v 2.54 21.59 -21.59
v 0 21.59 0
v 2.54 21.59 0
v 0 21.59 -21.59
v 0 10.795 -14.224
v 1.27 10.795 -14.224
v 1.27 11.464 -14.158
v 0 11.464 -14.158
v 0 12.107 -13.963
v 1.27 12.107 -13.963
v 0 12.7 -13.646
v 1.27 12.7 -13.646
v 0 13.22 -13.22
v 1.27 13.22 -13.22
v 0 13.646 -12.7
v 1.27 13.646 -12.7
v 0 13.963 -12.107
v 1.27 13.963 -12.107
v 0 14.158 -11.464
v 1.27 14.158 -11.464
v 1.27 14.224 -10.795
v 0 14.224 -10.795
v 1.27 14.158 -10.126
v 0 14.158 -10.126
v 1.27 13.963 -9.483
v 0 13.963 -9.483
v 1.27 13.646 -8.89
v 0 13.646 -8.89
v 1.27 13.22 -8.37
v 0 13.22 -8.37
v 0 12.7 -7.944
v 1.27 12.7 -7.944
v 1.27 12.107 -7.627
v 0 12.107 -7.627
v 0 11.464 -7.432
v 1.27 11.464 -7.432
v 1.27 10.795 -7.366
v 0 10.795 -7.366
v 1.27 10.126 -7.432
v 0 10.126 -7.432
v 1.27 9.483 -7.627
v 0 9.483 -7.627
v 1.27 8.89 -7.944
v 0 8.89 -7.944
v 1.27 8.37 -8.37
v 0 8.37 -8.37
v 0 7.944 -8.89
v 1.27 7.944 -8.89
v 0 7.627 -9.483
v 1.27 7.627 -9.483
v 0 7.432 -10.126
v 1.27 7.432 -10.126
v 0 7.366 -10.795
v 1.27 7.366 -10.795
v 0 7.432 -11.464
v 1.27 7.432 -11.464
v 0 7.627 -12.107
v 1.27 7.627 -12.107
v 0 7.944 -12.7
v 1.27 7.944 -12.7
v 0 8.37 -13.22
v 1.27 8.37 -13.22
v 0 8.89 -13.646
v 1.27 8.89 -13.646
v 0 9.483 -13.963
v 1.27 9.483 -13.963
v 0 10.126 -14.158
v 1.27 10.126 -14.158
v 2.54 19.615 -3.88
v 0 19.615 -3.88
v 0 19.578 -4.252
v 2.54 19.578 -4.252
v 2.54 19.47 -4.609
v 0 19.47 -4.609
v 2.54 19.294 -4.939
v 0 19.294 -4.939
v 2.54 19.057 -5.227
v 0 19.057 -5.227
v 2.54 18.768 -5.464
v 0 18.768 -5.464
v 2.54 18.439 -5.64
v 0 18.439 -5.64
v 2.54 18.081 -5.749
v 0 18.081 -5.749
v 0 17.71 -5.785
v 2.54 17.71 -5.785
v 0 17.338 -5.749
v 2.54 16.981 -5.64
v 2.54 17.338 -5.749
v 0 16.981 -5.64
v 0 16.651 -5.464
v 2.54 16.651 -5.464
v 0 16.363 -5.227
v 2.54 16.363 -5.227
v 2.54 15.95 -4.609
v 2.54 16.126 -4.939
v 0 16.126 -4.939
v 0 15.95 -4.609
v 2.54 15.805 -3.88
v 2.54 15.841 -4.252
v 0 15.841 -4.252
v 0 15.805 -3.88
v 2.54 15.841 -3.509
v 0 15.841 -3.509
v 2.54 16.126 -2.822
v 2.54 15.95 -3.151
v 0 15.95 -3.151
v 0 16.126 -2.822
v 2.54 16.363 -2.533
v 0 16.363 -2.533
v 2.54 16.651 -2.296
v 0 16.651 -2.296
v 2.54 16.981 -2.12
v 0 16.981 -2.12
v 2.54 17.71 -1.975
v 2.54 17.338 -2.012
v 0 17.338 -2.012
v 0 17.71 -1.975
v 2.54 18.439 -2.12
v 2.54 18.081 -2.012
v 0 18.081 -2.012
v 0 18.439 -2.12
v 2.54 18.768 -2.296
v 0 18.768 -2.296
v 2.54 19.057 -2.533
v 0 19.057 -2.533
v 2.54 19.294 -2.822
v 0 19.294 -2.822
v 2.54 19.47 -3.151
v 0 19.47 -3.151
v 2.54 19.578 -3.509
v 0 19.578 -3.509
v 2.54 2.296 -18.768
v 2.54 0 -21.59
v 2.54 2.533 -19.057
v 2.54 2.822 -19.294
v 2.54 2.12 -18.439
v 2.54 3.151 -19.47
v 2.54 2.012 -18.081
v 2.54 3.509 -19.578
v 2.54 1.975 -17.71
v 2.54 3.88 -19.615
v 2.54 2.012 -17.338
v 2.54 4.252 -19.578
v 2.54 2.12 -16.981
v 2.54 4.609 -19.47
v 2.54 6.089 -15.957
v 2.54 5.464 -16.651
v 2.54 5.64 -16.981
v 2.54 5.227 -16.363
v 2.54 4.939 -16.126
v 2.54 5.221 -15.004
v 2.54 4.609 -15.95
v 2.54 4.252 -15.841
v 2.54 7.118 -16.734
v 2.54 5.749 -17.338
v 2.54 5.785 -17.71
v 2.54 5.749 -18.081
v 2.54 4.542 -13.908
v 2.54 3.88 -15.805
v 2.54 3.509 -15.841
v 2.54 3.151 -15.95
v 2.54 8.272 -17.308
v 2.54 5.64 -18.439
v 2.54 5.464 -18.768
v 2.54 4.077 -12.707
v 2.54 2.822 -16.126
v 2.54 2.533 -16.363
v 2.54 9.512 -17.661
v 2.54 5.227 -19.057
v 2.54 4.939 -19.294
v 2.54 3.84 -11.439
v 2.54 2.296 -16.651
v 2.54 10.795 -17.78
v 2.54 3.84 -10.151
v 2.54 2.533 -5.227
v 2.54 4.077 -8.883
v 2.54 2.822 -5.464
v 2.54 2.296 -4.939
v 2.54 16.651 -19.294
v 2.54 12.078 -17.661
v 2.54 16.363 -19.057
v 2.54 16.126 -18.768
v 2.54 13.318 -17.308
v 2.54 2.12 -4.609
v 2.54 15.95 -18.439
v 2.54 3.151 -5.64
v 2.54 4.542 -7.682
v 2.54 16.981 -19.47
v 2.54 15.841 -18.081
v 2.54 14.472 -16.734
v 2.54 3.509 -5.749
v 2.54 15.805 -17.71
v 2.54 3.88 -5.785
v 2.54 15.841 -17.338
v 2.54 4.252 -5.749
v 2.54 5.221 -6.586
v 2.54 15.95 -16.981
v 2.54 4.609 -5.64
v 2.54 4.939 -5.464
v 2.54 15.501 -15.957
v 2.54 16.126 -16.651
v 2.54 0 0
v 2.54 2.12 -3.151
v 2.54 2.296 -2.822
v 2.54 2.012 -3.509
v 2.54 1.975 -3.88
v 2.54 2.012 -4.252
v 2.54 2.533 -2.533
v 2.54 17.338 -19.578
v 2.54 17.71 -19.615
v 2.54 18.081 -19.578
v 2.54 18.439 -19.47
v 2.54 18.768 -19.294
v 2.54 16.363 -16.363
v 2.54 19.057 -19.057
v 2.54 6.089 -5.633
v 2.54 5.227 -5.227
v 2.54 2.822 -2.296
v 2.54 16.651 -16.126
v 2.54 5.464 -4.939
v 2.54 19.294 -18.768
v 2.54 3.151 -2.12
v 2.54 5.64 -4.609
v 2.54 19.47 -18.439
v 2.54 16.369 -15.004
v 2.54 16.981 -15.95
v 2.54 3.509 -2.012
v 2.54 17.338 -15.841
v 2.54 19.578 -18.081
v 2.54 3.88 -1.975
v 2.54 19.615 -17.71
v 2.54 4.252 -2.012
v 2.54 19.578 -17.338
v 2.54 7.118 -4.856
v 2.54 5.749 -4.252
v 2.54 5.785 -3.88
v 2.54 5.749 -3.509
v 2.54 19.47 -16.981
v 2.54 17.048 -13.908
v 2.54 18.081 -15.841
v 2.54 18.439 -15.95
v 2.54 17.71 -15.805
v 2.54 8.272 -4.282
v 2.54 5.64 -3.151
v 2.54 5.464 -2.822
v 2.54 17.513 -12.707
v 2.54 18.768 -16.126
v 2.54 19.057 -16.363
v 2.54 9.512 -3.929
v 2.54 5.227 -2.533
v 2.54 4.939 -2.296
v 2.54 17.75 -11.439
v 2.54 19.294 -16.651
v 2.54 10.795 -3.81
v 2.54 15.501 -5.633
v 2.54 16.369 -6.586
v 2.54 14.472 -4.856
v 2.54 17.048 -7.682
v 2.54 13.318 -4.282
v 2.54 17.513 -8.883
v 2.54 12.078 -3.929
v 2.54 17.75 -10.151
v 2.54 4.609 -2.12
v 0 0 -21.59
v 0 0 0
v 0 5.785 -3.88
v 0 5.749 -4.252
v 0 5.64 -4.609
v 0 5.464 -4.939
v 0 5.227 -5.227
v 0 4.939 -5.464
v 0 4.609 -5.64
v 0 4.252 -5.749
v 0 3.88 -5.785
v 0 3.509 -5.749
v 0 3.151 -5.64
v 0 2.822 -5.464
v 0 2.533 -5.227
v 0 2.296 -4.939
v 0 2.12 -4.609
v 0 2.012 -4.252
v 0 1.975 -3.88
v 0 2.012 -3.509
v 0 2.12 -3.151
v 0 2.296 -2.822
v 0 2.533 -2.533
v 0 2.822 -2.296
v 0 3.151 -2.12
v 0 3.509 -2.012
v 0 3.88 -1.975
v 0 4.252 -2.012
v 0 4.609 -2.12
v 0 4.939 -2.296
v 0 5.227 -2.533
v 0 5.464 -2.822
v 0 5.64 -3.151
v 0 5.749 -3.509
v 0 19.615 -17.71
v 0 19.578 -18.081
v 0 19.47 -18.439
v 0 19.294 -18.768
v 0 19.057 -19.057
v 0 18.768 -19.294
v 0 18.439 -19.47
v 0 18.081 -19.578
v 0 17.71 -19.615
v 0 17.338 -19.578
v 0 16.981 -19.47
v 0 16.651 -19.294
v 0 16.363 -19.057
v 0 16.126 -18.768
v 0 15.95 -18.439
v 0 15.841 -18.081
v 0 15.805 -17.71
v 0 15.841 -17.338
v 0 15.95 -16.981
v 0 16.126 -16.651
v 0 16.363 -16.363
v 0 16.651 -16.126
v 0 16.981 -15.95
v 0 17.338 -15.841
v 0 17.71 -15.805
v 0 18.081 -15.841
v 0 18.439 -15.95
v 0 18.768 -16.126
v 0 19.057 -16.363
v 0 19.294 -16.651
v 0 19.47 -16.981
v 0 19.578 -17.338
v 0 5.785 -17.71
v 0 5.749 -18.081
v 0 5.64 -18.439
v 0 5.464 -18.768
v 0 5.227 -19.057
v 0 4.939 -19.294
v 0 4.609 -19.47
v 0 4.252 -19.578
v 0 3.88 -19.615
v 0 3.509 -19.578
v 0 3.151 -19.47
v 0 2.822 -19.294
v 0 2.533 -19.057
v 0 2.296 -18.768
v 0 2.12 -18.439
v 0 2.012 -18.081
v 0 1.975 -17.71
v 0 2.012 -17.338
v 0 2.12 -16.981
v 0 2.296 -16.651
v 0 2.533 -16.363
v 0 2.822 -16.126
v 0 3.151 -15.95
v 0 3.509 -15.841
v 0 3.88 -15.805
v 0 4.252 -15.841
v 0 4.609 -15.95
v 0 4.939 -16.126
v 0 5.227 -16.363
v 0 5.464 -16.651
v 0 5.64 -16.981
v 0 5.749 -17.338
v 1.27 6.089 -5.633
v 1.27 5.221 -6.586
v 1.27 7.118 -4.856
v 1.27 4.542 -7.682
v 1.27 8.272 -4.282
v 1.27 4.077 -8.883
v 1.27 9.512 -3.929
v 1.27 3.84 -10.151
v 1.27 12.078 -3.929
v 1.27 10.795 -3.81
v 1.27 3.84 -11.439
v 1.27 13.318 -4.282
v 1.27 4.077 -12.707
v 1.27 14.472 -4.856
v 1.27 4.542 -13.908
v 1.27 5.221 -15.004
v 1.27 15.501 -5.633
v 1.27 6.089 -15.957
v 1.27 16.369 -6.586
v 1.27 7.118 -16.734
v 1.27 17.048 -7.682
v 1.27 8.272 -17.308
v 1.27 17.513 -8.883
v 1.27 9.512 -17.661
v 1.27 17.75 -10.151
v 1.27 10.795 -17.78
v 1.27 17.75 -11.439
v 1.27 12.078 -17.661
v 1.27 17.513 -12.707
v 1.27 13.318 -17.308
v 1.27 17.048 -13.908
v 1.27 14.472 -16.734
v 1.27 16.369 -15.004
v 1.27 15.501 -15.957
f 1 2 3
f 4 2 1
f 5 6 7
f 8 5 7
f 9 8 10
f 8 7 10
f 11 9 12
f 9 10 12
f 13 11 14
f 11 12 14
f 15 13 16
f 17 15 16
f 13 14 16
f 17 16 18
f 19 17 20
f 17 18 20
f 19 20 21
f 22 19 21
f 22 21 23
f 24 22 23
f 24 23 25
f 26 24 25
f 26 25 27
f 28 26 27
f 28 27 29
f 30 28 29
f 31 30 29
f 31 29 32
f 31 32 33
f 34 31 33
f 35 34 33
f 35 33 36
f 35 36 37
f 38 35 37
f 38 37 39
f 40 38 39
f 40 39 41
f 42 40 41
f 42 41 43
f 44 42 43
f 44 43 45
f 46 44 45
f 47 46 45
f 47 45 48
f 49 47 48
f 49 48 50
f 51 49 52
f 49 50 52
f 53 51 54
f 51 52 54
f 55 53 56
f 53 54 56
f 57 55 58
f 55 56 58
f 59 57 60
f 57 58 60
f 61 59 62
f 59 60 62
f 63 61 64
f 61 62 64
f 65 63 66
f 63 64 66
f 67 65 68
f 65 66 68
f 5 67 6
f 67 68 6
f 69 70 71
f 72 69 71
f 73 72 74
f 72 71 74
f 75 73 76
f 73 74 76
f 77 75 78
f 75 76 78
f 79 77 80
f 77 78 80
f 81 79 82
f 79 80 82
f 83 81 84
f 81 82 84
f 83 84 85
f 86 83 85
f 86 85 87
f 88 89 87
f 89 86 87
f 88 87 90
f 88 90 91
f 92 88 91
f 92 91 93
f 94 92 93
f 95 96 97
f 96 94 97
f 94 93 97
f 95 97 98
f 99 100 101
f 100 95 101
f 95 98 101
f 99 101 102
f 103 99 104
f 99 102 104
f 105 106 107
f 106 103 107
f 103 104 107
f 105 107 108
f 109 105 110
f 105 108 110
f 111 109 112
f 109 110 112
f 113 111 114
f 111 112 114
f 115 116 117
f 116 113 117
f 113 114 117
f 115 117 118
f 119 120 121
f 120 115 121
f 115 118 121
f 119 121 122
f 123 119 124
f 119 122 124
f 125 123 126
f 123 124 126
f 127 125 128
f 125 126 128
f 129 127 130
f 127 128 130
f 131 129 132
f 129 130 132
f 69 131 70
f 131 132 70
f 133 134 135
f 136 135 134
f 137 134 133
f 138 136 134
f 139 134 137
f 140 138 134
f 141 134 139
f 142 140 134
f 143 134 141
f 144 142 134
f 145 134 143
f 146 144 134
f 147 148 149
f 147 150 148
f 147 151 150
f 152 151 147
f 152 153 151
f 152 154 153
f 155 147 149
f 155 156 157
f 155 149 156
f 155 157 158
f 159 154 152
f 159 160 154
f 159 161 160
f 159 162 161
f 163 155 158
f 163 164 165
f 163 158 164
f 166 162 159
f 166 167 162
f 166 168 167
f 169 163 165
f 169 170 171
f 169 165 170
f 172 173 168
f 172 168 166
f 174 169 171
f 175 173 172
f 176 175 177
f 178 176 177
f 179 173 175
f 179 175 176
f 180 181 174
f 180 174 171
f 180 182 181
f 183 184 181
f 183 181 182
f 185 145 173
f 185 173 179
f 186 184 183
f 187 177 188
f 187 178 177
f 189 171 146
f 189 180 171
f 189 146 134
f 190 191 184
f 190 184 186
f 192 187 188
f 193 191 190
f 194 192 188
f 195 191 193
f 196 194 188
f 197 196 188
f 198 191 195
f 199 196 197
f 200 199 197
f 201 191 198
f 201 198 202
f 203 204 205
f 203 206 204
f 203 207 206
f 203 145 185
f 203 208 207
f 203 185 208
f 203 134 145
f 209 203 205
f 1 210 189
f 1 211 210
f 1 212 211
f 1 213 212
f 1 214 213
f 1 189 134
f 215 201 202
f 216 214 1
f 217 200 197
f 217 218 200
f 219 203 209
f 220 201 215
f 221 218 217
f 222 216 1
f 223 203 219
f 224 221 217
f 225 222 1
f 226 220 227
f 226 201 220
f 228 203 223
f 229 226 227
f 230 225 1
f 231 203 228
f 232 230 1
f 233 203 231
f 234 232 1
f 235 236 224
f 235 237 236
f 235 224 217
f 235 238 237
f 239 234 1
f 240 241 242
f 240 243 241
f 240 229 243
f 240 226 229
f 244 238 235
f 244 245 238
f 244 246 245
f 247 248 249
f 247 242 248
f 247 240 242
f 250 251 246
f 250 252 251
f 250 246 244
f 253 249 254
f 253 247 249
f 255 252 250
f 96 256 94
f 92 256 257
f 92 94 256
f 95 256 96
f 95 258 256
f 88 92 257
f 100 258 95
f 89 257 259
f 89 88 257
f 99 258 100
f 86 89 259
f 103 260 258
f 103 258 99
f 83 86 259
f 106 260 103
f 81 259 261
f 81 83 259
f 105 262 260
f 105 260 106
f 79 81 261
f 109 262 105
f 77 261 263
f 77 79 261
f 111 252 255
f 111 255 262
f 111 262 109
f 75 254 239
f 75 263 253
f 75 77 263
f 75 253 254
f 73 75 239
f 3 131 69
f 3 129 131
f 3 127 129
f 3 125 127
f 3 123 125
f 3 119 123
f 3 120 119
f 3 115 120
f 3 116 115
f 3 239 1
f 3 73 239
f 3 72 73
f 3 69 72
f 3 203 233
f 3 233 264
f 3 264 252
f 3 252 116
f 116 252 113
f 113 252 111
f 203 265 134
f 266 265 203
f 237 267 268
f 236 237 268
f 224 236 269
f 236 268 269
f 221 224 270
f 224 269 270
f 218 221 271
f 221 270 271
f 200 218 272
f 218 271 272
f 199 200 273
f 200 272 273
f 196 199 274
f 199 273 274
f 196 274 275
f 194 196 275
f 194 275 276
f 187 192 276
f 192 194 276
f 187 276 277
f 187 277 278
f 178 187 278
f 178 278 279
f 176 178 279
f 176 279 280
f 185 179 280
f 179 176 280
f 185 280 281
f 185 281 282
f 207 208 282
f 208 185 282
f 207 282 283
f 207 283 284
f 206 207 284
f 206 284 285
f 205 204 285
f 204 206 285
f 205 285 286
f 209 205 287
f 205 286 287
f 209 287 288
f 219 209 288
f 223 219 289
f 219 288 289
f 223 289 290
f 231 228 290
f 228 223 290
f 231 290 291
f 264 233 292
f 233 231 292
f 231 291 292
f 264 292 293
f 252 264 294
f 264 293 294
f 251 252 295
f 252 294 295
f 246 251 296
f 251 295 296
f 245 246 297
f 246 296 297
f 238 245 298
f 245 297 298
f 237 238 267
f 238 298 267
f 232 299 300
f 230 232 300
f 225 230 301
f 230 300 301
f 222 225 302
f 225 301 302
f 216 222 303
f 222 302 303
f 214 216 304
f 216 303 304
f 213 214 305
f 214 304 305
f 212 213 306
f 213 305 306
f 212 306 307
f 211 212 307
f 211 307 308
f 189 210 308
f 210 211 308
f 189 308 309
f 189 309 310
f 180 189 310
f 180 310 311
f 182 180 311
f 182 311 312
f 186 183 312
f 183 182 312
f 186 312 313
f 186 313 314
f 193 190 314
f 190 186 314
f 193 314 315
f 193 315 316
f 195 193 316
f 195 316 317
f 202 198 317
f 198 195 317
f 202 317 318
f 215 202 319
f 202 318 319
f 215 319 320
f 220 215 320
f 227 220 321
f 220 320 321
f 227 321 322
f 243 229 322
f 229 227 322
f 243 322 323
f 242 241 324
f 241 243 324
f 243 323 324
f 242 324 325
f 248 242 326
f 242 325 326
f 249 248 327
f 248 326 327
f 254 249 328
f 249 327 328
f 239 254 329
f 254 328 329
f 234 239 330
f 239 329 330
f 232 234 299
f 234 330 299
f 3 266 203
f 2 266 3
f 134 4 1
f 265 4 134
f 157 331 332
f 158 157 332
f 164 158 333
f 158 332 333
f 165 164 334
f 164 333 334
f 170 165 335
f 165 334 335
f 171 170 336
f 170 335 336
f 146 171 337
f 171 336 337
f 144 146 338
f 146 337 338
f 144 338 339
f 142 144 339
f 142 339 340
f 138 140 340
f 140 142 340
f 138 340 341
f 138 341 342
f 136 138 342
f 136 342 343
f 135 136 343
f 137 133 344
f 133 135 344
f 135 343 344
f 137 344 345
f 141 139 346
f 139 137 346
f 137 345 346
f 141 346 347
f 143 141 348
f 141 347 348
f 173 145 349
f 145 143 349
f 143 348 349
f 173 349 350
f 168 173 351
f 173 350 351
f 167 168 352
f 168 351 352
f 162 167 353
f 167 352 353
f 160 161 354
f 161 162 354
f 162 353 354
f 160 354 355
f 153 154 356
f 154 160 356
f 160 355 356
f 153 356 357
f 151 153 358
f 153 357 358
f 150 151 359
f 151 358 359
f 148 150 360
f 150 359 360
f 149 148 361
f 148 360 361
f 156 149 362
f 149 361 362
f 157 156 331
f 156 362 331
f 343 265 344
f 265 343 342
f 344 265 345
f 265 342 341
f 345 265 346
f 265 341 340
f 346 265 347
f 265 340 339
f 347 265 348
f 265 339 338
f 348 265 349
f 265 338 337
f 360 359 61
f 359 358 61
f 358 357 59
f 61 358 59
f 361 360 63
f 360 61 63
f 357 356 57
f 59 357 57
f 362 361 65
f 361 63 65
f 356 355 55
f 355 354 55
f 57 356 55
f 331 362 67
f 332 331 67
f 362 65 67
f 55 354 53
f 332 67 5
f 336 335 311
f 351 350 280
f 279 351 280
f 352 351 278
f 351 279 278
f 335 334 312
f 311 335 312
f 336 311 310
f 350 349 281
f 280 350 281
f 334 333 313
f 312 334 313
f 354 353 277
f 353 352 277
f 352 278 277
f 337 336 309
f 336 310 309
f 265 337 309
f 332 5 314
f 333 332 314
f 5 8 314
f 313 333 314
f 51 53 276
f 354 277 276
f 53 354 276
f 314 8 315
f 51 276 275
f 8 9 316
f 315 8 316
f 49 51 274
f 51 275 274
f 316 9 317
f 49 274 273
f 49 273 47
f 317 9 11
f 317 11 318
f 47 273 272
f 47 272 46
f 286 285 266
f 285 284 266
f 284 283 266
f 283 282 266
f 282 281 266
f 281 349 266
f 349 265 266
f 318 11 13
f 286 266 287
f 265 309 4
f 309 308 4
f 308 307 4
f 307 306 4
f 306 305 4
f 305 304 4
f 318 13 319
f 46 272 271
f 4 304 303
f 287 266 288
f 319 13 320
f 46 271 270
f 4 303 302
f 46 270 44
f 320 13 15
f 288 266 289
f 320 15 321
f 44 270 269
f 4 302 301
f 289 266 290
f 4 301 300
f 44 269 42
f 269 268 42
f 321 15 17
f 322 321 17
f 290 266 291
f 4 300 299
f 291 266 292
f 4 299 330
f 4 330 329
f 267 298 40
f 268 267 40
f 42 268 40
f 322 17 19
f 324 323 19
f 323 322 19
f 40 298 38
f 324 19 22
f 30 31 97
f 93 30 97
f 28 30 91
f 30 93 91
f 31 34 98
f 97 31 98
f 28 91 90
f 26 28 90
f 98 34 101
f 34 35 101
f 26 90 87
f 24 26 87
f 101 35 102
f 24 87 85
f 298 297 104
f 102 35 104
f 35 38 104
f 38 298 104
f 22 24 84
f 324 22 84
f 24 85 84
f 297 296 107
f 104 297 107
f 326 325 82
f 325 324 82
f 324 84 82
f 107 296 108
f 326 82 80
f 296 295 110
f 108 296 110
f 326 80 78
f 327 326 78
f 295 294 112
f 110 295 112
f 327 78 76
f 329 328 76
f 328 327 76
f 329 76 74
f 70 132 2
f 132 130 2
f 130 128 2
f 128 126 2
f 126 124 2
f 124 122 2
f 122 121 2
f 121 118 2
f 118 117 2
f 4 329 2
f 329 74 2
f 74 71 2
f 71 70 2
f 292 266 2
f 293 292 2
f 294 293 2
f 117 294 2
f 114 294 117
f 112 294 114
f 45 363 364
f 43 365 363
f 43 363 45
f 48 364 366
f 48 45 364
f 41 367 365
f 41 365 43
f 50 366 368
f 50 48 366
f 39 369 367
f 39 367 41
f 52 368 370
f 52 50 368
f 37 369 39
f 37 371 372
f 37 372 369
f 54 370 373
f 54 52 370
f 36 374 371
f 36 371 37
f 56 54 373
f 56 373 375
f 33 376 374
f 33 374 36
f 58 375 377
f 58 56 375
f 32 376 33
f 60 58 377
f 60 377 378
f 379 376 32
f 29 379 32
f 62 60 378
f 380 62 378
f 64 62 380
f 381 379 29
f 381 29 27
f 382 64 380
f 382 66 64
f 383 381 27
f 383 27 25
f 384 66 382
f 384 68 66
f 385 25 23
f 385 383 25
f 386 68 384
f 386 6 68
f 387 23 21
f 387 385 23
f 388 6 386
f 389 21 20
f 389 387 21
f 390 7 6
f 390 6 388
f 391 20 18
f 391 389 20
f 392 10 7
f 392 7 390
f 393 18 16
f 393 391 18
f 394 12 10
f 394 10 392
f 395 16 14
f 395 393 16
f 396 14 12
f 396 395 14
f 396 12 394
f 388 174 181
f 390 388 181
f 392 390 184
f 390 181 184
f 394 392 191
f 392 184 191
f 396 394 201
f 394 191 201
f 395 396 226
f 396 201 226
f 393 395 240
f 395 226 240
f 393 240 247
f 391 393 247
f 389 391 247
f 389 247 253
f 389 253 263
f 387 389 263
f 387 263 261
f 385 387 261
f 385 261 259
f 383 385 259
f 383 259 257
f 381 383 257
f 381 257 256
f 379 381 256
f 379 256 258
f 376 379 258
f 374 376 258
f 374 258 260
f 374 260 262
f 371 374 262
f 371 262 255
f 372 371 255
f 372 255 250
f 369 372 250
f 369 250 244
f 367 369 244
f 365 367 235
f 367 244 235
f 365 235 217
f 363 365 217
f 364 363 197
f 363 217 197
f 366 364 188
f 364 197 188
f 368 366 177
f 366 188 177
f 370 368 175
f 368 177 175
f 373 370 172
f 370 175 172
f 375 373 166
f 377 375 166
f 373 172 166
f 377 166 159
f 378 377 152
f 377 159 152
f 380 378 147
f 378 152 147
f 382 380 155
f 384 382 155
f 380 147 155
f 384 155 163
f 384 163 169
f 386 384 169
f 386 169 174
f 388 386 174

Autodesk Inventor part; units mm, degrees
ref_plane "YZ Plane" through (0, 0, 0) normal (1, 0, 0) x (0, 1, 0)
ref_plane "XZ Plane" through (0, 0, 0) normal (0, 1, 0) x (-1, 0, 0)
ref_plane "XY Plane" through (0, 0, 0) normal (0, 0, 1) x (1, 0, 0)
sketch "Sketch1" plane through (0, 0, 0) normal (1, 0, 0) x (0, 1, 0)
  line L0 (0, 0) -> (21.59, 0)
  line L1 (21.59, 0) -> (21.59, -21.59)
  line L2 (21.59, -21.59) -> (0, -21.59)
  line L3 (0, -21.59) -> (0, 0)
  circle A0 centre (17.7098, -3.8802) radius 1.905
  circle A1 centre (17.7098, -17.7098) radius 1.905
  circle A2 centre (3.8802, -17.7098) radius 1.905
  circle A3 centre (3.8802, -3.8802) radius 1.905
  dimension "d0" = 21.59
  dimension "d1" = 21.59
  dimension "d3" = 3.81
  dimension "d4" = 3.81
  dimension "d5" = 3.81
  dimension "d6" = 3.81
extrude "Extrusion1" add sketch "Sketch1" along normal blind 2.54
sketch "Sketch2" plane through (2.54, 0, 0) normal (1, 0, 0) x (0, 0, -1)
  line L0 (21.59, 0) -> (21.59, 21.59) projected
  line L1 (21.59, 21.59) -> (0, 21.59) projected
  line L2 (0, 21.59) -> (0, 0) projected
  circle A0 centre (10.795, 10.795) radius 6.985
  dimension "d9" = 13.97
extrude "Extrusion2" cut sketch "Sketch2" against normal blind 1.27
sketch "Sketch3" plane through (1.27, 10.795, -10.795) normal (1, 0, 0) x (0, 0, -1)
  circle A0 centre (0, 0) radius 3.429
  point P0 (-10.795, -10.795)
  dimension "d12" = 6.858
extrude "Extrusion3" cut sketch "Sketch3" against normal blind 24.13
properties part number "BearingSpacer"
